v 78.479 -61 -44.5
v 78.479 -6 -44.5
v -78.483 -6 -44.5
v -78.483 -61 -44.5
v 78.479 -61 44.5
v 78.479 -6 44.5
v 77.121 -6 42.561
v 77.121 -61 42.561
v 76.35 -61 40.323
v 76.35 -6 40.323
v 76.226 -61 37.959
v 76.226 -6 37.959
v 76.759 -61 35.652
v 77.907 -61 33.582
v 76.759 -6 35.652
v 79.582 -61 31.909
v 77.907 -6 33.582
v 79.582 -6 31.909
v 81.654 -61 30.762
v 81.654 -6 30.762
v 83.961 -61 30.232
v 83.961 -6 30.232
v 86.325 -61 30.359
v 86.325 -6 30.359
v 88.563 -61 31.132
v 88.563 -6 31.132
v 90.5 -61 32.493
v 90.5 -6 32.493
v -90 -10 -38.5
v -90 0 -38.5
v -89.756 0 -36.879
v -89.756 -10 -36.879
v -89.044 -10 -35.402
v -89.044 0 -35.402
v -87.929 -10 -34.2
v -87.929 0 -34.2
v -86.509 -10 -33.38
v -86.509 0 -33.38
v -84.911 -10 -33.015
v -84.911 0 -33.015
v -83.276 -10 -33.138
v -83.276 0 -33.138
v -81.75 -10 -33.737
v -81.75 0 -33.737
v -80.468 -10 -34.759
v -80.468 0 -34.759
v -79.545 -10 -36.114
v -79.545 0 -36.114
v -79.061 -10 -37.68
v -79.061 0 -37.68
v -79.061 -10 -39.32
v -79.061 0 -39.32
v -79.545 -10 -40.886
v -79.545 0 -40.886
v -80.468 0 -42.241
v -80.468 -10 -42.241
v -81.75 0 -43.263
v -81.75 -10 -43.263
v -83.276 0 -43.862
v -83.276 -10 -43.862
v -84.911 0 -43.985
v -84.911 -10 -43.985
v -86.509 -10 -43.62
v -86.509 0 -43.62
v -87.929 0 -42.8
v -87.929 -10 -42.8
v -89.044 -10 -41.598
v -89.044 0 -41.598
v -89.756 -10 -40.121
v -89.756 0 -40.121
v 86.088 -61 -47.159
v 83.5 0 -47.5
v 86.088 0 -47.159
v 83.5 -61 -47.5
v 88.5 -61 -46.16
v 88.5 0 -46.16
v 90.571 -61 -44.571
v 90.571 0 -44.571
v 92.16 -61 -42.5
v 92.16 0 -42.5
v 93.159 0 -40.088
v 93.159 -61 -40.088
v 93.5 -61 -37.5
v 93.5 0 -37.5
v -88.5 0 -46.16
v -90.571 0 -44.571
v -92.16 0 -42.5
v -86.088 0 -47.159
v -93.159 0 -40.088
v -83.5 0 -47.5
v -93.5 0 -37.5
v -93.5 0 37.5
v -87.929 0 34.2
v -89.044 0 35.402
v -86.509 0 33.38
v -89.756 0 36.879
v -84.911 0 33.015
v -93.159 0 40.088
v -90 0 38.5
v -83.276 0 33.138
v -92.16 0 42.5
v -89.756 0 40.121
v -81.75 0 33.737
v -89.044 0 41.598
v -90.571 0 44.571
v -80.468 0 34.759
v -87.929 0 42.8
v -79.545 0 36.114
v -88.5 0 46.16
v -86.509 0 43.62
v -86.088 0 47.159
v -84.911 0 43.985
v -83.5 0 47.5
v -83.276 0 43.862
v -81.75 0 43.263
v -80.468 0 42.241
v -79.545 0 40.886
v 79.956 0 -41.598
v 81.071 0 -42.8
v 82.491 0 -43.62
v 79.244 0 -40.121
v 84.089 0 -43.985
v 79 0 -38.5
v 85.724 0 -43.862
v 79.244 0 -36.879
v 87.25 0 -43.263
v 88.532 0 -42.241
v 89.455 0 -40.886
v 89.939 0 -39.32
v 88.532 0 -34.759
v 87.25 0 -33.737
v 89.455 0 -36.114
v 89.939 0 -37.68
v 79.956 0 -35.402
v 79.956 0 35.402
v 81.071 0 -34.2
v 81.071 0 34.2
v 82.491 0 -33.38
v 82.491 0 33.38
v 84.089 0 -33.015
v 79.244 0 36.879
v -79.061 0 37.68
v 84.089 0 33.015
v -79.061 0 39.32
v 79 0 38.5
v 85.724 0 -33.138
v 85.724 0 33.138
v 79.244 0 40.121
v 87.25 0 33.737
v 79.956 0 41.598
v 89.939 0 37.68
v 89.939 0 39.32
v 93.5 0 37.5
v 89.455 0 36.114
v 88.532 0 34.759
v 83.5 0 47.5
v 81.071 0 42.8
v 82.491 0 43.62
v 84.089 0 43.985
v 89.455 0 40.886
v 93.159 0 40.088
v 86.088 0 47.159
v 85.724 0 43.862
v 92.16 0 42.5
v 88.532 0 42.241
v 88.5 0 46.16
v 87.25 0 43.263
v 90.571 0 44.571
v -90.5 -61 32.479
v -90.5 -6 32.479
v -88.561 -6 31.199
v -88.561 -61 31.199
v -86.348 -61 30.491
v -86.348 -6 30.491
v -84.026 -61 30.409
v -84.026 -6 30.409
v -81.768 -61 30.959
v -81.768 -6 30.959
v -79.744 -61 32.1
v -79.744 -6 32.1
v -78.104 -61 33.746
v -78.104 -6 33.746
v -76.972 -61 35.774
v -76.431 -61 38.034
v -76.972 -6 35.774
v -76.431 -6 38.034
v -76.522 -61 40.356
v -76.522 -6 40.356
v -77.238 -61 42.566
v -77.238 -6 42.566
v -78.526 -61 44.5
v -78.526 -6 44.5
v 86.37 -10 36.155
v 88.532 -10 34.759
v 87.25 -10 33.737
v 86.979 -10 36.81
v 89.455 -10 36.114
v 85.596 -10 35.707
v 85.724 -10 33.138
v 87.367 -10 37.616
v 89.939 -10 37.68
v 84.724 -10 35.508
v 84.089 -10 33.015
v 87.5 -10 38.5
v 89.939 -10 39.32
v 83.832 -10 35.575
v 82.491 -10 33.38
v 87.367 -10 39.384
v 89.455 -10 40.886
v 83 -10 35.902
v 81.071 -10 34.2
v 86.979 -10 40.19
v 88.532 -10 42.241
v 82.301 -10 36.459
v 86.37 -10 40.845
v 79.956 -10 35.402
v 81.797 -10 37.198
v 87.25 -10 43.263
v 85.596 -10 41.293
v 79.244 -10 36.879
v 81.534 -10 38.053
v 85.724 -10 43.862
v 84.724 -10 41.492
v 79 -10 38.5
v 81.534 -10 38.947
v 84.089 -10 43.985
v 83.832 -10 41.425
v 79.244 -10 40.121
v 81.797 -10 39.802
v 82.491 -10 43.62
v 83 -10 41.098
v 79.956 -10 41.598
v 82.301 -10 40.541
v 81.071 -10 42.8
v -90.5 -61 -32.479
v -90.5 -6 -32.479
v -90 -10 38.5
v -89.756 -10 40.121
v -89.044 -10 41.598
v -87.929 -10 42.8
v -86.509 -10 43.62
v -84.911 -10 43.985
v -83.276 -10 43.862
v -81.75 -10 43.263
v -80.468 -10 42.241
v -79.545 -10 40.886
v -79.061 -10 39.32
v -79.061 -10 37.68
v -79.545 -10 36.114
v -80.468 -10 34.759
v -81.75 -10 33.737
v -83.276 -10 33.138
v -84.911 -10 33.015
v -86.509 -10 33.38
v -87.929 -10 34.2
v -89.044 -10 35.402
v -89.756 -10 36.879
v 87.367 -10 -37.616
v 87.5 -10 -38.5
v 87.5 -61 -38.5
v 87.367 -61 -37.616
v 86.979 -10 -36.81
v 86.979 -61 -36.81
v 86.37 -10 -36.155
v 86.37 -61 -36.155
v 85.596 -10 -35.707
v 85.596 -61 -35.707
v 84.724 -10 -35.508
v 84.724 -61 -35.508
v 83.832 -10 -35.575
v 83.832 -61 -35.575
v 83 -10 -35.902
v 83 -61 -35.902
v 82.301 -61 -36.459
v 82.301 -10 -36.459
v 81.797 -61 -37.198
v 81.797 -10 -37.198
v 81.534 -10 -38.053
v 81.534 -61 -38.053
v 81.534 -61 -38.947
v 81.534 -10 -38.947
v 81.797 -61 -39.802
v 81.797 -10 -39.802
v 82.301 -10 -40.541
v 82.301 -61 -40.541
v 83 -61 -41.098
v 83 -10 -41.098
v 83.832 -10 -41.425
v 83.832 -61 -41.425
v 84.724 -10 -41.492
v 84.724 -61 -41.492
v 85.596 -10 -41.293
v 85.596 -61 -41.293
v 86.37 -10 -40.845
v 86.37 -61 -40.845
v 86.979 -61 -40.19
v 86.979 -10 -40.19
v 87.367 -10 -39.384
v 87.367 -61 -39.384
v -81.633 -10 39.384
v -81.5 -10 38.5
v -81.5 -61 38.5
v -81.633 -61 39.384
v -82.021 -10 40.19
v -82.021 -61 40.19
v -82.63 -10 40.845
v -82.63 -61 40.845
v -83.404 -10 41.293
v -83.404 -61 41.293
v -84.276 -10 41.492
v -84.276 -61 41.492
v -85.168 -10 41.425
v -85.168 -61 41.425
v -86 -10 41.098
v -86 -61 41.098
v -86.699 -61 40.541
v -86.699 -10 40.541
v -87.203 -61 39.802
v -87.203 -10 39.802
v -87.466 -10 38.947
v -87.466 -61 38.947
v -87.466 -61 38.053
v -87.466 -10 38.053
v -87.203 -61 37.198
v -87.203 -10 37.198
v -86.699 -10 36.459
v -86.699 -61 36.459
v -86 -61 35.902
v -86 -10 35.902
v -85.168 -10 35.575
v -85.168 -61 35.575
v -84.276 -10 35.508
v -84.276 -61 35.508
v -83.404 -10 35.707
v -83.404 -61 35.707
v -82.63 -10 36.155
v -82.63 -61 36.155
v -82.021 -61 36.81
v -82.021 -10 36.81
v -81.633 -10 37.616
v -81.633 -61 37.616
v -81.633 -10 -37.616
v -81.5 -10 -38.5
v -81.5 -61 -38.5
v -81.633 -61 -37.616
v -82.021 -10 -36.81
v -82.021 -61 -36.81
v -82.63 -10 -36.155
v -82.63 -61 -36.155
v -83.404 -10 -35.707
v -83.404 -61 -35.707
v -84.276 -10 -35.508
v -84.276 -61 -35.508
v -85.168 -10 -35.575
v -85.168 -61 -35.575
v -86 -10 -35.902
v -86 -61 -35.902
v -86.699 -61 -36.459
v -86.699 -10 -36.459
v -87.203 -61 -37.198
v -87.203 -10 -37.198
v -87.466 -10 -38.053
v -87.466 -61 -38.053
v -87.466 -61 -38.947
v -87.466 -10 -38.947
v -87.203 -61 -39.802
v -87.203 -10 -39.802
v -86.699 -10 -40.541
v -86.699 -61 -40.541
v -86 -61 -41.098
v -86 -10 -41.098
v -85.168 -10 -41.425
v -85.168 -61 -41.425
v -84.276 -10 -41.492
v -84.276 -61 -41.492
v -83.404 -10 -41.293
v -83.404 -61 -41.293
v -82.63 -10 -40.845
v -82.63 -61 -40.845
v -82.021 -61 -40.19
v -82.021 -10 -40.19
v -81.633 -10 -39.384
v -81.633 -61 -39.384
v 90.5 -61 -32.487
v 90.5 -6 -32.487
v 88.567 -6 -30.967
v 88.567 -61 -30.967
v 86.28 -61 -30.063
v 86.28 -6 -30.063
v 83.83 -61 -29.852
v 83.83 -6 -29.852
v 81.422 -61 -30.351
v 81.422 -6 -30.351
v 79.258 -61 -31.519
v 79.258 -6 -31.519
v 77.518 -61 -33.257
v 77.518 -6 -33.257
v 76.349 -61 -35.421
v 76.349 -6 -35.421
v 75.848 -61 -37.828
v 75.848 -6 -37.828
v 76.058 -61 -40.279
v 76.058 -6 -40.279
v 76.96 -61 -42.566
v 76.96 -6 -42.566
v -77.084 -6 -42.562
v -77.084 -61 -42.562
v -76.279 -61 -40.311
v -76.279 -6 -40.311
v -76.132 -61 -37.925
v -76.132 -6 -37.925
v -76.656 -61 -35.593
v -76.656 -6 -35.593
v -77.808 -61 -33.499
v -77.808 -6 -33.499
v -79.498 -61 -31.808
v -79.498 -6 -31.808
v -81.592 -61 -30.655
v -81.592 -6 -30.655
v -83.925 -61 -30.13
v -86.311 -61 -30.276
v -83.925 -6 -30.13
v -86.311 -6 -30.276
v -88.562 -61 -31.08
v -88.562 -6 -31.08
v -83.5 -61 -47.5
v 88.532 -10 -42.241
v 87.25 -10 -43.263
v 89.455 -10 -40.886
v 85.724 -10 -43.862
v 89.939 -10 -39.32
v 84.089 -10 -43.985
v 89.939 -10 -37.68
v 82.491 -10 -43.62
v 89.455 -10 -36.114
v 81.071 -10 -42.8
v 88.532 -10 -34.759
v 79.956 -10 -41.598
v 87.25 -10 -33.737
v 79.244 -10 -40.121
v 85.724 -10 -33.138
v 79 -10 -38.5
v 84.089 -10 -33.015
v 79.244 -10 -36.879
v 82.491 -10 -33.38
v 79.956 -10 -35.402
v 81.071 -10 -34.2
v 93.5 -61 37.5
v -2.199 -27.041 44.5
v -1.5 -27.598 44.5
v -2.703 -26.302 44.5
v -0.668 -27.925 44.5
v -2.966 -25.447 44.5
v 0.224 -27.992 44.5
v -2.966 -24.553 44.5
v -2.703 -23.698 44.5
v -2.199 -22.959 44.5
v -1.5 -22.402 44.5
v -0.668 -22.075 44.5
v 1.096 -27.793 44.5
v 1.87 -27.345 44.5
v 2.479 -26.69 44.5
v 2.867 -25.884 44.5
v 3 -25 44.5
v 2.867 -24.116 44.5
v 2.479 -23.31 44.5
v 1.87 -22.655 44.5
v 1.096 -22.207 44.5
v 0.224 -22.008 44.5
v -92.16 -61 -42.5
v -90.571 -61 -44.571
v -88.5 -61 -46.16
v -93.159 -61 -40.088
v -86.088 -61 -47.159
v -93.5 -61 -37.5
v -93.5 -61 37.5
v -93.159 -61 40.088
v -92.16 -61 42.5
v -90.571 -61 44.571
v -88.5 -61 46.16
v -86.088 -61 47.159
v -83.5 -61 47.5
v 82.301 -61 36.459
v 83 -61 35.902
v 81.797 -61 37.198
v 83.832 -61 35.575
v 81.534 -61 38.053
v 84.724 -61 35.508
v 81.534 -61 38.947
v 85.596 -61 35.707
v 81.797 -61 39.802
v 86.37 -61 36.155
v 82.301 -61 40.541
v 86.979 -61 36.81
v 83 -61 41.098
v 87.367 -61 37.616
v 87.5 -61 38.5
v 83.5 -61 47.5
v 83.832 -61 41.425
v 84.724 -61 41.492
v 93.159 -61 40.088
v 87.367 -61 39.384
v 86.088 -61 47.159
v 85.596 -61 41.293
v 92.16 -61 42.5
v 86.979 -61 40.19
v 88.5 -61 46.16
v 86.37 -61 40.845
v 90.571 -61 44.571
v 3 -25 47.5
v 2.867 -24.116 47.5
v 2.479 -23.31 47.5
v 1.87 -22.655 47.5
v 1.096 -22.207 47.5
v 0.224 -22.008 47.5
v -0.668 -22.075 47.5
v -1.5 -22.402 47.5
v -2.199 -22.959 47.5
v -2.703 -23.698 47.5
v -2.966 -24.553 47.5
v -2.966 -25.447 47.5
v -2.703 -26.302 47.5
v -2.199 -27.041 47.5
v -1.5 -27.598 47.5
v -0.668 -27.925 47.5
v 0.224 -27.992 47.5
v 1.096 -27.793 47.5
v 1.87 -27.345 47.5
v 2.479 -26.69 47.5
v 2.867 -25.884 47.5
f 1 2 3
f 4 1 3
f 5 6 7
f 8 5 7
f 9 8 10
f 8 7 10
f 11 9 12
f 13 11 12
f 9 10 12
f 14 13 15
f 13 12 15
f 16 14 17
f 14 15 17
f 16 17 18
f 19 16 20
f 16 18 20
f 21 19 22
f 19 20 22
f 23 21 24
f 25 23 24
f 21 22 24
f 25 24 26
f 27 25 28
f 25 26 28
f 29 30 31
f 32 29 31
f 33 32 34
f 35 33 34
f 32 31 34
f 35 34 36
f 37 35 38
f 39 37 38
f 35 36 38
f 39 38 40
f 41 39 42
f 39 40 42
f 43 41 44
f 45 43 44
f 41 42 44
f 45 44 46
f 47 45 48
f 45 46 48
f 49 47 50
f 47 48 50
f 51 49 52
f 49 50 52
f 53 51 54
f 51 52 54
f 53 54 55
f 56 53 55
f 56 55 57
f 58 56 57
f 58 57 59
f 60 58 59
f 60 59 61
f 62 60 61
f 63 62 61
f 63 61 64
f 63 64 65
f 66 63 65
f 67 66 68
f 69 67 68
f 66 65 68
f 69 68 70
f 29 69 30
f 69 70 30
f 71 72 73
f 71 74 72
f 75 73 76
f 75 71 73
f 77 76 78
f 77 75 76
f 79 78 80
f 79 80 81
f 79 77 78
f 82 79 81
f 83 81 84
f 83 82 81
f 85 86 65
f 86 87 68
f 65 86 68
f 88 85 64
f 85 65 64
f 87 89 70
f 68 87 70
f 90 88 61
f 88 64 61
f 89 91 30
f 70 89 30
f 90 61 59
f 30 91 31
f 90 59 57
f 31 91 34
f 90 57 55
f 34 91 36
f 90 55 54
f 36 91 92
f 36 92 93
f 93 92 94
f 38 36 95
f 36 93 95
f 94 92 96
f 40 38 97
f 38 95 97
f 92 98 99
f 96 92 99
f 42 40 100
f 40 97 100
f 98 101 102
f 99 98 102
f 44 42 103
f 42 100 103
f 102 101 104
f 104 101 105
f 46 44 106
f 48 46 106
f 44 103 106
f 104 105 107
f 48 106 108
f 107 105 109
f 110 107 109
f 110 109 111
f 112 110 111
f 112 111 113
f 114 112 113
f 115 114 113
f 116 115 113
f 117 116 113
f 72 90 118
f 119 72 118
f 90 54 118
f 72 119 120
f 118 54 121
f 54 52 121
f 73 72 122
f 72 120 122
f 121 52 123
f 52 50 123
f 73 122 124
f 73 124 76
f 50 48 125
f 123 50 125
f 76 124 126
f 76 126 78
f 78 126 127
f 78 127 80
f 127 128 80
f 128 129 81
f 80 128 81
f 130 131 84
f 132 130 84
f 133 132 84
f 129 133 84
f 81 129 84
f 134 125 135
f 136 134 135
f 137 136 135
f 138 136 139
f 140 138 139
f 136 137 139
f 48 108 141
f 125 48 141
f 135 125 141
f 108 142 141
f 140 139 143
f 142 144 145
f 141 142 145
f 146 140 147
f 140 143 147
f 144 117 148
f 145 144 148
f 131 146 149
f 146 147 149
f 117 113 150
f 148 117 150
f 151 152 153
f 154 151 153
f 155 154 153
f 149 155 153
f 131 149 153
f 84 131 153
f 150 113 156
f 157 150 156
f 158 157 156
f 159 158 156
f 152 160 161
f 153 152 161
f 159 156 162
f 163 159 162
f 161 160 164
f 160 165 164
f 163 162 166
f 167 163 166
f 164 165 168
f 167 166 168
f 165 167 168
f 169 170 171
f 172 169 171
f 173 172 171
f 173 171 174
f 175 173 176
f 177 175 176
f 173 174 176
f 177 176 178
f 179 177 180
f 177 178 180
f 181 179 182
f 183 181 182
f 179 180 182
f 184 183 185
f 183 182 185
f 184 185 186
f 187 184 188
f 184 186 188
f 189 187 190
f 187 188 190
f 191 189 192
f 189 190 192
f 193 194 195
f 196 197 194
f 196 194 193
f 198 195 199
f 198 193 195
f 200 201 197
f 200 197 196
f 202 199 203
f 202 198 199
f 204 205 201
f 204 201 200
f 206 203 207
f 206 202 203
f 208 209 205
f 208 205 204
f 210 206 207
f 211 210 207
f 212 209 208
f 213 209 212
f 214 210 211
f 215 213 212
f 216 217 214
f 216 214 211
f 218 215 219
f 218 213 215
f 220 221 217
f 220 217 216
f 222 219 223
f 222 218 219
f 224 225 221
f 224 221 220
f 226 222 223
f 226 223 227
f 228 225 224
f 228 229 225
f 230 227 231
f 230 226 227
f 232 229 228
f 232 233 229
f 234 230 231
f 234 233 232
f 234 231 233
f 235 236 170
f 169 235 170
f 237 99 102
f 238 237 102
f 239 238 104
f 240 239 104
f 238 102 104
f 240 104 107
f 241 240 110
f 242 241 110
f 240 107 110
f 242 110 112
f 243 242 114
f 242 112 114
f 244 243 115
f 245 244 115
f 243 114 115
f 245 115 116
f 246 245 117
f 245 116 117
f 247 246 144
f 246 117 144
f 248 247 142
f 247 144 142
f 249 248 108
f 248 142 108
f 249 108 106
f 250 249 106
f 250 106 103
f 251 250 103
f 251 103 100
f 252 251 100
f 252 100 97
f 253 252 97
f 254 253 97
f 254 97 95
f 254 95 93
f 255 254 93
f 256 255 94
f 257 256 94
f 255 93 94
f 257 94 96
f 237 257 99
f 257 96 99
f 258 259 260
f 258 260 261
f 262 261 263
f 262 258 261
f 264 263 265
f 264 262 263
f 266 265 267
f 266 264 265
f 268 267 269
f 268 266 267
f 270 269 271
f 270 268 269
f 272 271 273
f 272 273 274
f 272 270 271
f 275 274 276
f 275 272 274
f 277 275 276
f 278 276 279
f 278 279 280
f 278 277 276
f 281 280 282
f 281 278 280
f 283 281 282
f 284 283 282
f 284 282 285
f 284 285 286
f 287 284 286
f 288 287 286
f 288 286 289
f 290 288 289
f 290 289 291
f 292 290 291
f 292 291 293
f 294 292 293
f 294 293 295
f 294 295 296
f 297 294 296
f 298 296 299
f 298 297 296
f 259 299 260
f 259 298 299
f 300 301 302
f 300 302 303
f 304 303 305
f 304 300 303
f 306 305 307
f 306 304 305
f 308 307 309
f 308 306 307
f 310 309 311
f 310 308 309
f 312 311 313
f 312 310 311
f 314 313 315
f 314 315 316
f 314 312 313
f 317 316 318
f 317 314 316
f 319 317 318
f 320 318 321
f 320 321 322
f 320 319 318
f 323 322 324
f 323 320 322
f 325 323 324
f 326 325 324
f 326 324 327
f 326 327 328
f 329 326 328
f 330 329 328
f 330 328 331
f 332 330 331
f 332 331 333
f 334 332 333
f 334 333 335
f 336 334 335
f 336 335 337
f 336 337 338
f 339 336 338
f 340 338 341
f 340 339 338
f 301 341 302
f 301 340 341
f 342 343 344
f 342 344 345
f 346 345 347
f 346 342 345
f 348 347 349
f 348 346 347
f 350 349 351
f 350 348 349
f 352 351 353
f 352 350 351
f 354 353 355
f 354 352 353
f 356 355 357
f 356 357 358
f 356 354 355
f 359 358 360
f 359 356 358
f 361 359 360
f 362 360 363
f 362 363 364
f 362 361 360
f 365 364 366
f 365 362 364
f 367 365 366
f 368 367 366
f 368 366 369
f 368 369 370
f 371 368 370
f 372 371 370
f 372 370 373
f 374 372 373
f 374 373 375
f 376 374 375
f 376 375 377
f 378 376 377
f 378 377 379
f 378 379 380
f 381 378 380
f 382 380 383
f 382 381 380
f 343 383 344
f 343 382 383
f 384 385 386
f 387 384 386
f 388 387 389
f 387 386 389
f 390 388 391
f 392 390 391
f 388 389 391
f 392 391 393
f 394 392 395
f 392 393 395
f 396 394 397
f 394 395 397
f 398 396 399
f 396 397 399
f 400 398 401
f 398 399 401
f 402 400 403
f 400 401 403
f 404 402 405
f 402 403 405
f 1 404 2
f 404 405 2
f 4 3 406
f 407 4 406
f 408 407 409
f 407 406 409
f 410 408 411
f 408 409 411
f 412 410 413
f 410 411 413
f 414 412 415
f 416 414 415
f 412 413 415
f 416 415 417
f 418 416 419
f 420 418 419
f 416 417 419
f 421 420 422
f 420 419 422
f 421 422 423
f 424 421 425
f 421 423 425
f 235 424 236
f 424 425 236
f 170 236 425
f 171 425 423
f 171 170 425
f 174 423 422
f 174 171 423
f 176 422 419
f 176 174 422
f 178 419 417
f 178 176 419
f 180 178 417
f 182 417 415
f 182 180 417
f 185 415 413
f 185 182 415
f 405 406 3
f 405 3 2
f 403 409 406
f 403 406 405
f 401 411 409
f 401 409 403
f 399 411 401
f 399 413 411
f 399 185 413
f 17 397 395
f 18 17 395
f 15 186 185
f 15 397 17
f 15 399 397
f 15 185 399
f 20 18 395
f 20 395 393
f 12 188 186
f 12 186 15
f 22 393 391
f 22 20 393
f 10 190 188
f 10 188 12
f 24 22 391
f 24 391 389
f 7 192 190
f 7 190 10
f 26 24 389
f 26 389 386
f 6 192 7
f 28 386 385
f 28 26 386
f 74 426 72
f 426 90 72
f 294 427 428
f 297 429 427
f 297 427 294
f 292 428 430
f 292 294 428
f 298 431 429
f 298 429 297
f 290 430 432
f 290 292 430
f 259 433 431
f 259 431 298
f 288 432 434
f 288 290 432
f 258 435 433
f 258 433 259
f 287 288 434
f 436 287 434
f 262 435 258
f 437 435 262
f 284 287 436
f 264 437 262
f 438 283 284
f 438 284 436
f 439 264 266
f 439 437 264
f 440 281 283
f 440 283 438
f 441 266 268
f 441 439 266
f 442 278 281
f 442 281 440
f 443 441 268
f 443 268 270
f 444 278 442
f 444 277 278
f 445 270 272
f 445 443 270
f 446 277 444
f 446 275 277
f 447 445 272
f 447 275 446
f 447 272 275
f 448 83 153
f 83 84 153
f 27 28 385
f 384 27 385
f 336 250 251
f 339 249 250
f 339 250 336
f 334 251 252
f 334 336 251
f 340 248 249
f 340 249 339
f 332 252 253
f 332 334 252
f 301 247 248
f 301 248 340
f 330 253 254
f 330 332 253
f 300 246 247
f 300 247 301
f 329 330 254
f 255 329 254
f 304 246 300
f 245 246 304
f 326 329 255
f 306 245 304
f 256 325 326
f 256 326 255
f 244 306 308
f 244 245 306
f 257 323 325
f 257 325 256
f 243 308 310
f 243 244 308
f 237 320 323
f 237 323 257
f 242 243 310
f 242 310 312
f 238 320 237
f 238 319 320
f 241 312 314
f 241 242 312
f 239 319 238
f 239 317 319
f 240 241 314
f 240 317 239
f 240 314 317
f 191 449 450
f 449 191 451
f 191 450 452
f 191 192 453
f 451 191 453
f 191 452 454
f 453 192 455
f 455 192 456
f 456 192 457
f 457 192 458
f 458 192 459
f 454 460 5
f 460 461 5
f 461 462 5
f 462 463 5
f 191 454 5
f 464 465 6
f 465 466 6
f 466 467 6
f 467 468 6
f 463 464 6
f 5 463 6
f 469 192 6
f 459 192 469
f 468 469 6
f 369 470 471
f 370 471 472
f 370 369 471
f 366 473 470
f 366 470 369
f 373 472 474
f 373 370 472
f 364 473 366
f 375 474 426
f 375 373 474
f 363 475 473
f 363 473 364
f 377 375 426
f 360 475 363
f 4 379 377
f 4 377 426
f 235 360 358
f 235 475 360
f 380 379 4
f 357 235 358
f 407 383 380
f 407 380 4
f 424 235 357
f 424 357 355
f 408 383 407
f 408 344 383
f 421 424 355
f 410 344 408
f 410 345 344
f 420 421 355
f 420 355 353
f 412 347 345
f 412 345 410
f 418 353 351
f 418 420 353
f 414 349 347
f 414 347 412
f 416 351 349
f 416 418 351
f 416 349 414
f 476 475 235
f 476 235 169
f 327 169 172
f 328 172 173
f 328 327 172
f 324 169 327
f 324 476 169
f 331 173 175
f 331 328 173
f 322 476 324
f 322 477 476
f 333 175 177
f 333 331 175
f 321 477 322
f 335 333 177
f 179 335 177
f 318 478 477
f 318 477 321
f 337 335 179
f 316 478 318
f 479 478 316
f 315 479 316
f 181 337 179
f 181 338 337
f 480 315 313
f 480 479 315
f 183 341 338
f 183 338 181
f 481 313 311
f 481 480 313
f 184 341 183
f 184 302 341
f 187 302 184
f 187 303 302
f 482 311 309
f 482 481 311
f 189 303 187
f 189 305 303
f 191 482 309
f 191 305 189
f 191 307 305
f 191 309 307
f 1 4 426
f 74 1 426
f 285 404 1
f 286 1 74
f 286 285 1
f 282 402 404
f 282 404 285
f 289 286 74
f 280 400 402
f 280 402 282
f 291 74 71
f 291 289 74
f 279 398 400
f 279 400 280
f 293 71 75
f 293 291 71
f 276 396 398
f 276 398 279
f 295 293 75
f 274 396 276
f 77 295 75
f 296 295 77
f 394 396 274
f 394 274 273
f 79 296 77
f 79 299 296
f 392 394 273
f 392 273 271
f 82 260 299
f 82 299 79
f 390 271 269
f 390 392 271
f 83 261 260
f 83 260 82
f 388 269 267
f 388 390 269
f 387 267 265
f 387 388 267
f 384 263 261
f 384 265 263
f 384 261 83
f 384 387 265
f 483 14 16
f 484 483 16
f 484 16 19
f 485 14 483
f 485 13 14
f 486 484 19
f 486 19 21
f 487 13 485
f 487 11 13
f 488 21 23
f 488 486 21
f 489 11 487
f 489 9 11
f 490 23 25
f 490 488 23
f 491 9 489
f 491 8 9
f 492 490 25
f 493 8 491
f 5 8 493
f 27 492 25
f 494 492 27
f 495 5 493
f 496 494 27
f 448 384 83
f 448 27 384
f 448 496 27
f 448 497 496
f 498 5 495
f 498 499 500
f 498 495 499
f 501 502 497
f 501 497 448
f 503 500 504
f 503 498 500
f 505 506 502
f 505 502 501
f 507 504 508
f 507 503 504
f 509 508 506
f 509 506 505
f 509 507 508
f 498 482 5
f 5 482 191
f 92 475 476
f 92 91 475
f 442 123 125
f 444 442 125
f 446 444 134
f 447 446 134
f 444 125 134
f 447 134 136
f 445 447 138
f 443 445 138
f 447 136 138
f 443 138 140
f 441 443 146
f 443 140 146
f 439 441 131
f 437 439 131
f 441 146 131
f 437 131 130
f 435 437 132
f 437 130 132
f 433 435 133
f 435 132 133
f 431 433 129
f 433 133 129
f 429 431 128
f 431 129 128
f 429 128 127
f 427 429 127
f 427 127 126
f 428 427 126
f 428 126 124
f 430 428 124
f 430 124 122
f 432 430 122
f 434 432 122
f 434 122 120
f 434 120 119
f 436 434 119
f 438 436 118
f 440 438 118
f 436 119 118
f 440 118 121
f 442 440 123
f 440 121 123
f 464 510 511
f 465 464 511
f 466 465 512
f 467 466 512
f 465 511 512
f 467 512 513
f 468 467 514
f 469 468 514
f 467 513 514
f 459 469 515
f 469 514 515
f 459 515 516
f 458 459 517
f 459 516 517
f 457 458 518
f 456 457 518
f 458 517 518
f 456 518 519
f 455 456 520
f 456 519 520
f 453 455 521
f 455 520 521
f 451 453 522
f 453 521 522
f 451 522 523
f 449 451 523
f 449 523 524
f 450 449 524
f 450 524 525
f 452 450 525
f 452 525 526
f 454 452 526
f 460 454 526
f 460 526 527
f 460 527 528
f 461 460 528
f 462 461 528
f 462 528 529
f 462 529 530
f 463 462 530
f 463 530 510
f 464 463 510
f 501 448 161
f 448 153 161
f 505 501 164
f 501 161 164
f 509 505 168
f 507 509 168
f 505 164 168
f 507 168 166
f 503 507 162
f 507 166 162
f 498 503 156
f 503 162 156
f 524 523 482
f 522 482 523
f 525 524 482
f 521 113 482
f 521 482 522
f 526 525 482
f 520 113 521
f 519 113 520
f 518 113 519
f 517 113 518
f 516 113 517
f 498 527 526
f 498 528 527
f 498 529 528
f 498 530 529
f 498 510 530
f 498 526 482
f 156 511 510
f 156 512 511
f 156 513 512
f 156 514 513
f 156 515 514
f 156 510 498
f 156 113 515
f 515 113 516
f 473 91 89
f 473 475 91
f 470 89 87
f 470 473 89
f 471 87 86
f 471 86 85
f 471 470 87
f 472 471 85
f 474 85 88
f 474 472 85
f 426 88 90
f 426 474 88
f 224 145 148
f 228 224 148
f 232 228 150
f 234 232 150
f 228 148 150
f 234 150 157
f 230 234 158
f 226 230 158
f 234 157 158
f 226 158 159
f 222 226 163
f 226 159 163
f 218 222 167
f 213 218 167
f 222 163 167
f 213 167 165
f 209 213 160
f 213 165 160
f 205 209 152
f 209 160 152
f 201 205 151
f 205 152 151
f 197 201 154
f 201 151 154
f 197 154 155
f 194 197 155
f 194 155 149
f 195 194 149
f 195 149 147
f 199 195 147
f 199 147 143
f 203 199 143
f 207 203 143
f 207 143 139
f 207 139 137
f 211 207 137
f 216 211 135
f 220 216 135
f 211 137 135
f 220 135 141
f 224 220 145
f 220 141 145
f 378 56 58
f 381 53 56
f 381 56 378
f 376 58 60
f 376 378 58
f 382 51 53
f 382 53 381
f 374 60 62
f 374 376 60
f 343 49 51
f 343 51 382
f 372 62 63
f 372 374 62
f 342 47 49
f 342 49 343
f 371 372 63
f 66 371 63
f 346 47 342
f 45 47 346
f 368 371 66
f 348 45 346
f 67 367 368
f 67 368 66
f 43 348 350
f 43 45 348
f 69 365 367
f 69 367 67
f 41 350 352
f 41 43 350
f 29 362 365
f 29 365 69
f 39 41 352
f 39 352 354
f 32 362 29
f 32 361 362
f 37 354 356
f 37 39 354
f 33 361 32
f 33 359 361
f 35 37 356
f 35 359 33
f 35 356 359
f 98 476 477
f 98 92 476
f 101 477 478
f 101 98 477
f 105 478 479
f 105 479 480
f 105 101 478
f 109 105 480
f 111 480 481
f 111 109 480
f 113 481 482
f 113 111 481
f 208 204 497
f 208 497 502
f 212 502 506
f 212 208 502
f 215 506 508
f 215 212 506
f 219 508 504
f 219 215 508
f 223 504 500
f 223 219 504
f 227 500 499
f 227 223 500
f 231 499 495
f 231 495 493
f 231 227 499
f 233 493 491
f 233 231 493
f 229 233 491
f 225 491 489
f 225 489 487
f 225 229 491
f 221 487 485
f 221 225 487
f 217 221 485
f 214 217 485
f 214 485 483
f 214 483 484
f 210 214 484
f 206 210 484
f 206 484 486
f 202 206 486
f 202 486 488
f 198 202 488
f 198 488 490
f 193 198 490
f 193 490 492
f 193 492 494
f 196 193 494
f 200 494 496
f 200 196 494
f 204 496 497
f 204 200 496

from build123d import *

# Parameters (mm, degrees)
F0_W     = 187
F0_H     = 95
F0_R     = 3
F1_DEPTH = 6
F2_W     = 187
F2_H     = 95
F2_R     = 3
F3_DEPTH = 55
F4_R     = 10
F5_R     = 5.5
F6_DEPTH = 10
F7_R     = 3
F8_DEPTH = 25


with BuildPart() as f1:
    # F0 (on Front) → F1 (new body)
    with BuildSketch(Plane.XZ):
        Rectangle(F0_W, F0_H)
        with Locations((-84.5, -38.5)):
            Circle(F0_R, mode=Mode.SUBTRACT)
        with Locations((84.5, -38.5)):
            Circle(F0_R, mode=Mode.SUBTRACT)
        with Locations((-84.5, 38.5)):
            Circle(F0_R, mode=Mode.SUBTRACT)
        with Locations((84.5, 38.5)):
            Circle(F0_R, mode=Mode.SUBTRACT)
    extrude(amount=F1_DEPTH)

    # F2 (on face) → F3 (join)
    with BuildSketch(Plane.XZ.offset(6)):
        Rectangle(F2_W, F2_H)
        with Locations((-84.5, -38.5)):
            Circle(F2_R, mode=Mode.SUBTRACT)
        with Locations((84.5, -38.5)):
            Circle(F2_R, mode=Mode.SUBTRACT)
        with BuildLine():
            ThreePointArc((78.479203, 44.5), (78.686333, 32.686563), (90.5, 32.492996))
            Line((90.5, 32.492996), (90.5, -32.487318))
            ThreePointArc((90.5, -32.487318), (78.324787, -32.32468), (78.479203, -44.5))
            Line((78.479203, -44.5), (-78.483447, -44.5))
            ThreePointArc((-78.483447, -44.5), (-78.593686, -32.593646), (-90.5, -32.479203))
            Line((-90.5, -32.479203), (-90.5, 32.479203))
            ThreePointArc((-90.5, 32.479203), (-78.867749, 32.866318), (-78.526316, 44.5))
            Line((-78.526316, 44.5), (78.479203, 44.5))
        make_face(mode=Mode.SUBTRACT)
        with Locations((-84.5, 38.5)):
            Circle(F2_R, mode=Mode.SUBTRACT)
        with Locations((84.5, 38.5)):
            Circle(F2_R, mode=Mode.SUBTRACT)
    extrude(amount=F3_DEPTH)

    # F4
    f4_edges = [f1.edges().sort_by_distance(p)[0] for p in [
        (-93.5, -30.5, -47.5),
        (-93.5, -30.5, 47.5),
        (93.5, -30.5, 47.5),
        (93.5, -30.5, -47.5),
    ]]
    fillet(f4_edges, radius=F4_R)

    # F5 (on face) → F6 (cut)
    with BuildSketch(Plane(origin=(0, 0, 0), x_dir=(-1, 0, 0), z_dir=(0, 1, 0))):
        with Locations((-84.5, 38.5)):
            Circle(F5_R)
        with Locations((-84.5, -38.5)):
            Circle(F5_R)
        with Locations((84.5, -38.5)):
            Circle(F5_R)
        with Locations((84.5, 38.5)):
            Circle(F5_R)
    extrude(amount=-F6_DEPTH, mode=Mode.SUBTRACT)

    # F7 (on face) → F8 (cut)
    with BuildSketch(Plane.XY.offset(47.5)):
        with Locations((0, -25)):
            Circle(F7_R)
    extrude(amount=-F8_DEPTH, mode=Mode.SUBTRACT)


solid = f1.part
